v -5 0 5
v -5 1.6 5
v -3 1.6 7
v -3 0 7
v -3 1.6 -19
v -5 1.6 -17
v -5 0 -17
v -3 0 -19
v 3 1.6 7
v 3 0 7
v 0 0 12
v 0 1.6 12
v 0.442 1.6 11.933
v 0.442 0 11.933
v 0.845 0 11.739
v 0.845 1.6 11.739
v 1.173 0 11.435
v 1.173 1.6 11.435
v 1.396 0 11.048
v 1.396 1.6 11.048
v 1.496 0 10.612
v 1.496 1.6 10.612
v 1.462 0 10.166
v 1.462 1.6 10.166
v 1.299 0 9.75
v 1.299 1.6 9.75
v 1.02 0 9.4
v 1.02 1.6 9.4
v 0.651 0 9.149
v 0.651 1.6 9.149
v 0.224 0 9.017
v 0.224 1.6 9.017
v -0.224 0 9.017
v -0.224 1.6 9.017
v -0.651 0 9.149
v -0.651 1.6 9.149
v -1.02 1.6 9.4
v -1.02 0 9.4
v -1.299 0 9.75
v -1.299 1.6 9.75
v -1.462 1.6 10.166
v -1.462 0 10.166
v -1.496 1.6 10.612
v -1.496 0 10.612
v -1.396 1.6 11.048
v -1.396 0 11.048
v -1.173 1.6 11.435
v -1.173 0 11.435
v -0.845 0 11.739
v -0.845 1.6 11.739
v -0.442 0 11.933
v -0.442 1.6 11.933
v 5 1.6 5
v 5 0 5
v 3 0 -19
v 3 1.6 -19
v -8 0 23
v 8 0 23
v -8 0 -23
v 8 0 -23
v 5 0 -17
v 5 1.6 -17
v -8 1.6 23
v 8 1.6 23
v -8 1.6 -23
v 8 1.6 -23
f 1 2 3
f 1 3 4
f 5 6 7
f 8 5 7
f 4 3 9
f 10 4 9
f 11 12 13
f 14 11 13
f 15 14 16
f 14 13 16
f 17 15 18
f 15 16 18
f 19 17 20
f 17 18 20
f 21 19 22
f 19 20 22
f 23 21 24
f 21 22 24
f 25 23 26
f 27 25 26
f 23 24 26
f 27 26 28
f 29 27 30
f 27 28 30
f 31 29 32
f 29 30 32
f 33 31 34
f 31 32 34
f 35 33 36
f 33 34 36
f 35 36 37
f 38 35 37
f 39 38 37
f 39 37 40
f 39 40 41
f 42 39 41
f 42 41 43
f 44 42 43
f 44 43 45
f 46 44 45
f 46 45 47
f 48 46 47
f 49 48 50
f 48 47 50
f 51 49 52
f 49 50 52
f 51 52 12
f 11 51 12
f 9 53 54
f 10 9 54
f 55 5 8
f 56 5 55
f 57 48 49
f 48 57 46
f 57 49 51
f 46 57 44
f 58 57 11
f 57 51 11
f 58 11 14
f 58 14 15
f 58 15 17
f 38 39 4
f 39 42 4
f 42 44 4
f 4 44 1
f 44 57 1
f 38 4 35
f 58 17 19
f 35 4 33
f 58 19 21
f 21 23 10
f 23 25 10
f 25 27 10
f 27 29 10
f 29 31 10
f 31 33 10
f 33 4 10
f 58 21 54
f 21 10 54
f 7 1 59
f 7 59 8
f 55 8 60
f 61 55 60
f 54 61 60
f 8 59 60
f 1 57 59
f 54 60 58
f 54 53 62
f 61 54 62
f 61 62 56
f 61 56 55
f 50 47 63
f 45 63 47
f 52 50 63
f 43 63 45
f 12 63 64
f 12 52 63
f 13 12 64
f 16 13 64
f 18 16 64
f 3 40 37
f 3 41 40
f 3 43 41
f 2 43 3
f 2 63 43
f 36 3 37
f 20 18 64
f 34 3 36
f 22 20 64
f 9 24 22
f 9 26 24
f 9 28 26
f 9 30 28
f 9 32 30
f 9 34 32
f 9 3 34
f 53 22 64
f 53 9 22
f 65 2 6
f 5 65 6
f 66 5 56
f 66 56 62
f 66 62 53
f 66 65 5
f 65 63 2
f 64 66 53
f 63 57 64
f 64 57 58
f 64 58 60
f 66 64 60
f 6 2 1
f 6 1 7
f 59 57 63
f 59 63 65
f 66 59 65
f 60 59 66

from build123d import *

# Parameters (mm, degrees)
SKETCH1_W           = 16
SKETCH1_H           = 46
BOSS_EXTRUDE1_DEPTH = 1.6
SKETCH3_W           = 10
SKETCH3_H           = 26
CUT_EXTRUDE2_DEPTH  = 1.6
CHAMFER2_SIZE       = 2
SKETCH4_R           = 1.5
CUT_EXTRUDE3_DEPTH  = 1.6


with BuildPart() as part:
    # Sketch1 → Boss-Extrude1 (new body)
    with BuildSketch(Plane(origin=(0, 0, 0), x_dir=(1, 0, 0), z_dir=(0, 1, 0))):
        Rectangle(SKETCH1_W, SKETCH1_H)
    extrude(amount=BOSS_EXTRUDE1_DEPTH)

    # Sketch3 → Cut-Extrude2 (cut)
    with BuildSketch(Plane(origin=(0, 1.6, 0), x_dir=(1, 0, 0), z_dir=(0, 1, 0))):
        with Locations((0, 6)):
            Rectangle(SKETCH3_W, SKETCH3_H)
    extrude(amount=-CUT_EXTRUDE2_DEPTH, mode=Mode.SUBTRACT)

    # Chamfer2
    chamfer2_edges = [part.edges().sort_by_distance(p)[0] for p in [
        (5, 0.8, 7),
        (5, 0.8, -19),
        (-5, 0.8, -19),
        (-5, 0.8, 7),
    ]]
    chamfer(chamfer2_edges, length=CHAMFER2_SIZE)

    # Sketch4 → Cut-Extrude3 (cut)
    with BuildSketch(Plane(origin=(0, 1.6, 0), x_dir=(1, 0, 0), z_dir=(0, 1, 0))):
        with Locations(Location((0, -10.5, 0), (0, 0, 270))):
            Circle(SKETCH4_R)
    extrude(amount=-CUT_EXTRUDE3_DEPTH, mode=Mode.SUBTRACT)


solid = part.part
